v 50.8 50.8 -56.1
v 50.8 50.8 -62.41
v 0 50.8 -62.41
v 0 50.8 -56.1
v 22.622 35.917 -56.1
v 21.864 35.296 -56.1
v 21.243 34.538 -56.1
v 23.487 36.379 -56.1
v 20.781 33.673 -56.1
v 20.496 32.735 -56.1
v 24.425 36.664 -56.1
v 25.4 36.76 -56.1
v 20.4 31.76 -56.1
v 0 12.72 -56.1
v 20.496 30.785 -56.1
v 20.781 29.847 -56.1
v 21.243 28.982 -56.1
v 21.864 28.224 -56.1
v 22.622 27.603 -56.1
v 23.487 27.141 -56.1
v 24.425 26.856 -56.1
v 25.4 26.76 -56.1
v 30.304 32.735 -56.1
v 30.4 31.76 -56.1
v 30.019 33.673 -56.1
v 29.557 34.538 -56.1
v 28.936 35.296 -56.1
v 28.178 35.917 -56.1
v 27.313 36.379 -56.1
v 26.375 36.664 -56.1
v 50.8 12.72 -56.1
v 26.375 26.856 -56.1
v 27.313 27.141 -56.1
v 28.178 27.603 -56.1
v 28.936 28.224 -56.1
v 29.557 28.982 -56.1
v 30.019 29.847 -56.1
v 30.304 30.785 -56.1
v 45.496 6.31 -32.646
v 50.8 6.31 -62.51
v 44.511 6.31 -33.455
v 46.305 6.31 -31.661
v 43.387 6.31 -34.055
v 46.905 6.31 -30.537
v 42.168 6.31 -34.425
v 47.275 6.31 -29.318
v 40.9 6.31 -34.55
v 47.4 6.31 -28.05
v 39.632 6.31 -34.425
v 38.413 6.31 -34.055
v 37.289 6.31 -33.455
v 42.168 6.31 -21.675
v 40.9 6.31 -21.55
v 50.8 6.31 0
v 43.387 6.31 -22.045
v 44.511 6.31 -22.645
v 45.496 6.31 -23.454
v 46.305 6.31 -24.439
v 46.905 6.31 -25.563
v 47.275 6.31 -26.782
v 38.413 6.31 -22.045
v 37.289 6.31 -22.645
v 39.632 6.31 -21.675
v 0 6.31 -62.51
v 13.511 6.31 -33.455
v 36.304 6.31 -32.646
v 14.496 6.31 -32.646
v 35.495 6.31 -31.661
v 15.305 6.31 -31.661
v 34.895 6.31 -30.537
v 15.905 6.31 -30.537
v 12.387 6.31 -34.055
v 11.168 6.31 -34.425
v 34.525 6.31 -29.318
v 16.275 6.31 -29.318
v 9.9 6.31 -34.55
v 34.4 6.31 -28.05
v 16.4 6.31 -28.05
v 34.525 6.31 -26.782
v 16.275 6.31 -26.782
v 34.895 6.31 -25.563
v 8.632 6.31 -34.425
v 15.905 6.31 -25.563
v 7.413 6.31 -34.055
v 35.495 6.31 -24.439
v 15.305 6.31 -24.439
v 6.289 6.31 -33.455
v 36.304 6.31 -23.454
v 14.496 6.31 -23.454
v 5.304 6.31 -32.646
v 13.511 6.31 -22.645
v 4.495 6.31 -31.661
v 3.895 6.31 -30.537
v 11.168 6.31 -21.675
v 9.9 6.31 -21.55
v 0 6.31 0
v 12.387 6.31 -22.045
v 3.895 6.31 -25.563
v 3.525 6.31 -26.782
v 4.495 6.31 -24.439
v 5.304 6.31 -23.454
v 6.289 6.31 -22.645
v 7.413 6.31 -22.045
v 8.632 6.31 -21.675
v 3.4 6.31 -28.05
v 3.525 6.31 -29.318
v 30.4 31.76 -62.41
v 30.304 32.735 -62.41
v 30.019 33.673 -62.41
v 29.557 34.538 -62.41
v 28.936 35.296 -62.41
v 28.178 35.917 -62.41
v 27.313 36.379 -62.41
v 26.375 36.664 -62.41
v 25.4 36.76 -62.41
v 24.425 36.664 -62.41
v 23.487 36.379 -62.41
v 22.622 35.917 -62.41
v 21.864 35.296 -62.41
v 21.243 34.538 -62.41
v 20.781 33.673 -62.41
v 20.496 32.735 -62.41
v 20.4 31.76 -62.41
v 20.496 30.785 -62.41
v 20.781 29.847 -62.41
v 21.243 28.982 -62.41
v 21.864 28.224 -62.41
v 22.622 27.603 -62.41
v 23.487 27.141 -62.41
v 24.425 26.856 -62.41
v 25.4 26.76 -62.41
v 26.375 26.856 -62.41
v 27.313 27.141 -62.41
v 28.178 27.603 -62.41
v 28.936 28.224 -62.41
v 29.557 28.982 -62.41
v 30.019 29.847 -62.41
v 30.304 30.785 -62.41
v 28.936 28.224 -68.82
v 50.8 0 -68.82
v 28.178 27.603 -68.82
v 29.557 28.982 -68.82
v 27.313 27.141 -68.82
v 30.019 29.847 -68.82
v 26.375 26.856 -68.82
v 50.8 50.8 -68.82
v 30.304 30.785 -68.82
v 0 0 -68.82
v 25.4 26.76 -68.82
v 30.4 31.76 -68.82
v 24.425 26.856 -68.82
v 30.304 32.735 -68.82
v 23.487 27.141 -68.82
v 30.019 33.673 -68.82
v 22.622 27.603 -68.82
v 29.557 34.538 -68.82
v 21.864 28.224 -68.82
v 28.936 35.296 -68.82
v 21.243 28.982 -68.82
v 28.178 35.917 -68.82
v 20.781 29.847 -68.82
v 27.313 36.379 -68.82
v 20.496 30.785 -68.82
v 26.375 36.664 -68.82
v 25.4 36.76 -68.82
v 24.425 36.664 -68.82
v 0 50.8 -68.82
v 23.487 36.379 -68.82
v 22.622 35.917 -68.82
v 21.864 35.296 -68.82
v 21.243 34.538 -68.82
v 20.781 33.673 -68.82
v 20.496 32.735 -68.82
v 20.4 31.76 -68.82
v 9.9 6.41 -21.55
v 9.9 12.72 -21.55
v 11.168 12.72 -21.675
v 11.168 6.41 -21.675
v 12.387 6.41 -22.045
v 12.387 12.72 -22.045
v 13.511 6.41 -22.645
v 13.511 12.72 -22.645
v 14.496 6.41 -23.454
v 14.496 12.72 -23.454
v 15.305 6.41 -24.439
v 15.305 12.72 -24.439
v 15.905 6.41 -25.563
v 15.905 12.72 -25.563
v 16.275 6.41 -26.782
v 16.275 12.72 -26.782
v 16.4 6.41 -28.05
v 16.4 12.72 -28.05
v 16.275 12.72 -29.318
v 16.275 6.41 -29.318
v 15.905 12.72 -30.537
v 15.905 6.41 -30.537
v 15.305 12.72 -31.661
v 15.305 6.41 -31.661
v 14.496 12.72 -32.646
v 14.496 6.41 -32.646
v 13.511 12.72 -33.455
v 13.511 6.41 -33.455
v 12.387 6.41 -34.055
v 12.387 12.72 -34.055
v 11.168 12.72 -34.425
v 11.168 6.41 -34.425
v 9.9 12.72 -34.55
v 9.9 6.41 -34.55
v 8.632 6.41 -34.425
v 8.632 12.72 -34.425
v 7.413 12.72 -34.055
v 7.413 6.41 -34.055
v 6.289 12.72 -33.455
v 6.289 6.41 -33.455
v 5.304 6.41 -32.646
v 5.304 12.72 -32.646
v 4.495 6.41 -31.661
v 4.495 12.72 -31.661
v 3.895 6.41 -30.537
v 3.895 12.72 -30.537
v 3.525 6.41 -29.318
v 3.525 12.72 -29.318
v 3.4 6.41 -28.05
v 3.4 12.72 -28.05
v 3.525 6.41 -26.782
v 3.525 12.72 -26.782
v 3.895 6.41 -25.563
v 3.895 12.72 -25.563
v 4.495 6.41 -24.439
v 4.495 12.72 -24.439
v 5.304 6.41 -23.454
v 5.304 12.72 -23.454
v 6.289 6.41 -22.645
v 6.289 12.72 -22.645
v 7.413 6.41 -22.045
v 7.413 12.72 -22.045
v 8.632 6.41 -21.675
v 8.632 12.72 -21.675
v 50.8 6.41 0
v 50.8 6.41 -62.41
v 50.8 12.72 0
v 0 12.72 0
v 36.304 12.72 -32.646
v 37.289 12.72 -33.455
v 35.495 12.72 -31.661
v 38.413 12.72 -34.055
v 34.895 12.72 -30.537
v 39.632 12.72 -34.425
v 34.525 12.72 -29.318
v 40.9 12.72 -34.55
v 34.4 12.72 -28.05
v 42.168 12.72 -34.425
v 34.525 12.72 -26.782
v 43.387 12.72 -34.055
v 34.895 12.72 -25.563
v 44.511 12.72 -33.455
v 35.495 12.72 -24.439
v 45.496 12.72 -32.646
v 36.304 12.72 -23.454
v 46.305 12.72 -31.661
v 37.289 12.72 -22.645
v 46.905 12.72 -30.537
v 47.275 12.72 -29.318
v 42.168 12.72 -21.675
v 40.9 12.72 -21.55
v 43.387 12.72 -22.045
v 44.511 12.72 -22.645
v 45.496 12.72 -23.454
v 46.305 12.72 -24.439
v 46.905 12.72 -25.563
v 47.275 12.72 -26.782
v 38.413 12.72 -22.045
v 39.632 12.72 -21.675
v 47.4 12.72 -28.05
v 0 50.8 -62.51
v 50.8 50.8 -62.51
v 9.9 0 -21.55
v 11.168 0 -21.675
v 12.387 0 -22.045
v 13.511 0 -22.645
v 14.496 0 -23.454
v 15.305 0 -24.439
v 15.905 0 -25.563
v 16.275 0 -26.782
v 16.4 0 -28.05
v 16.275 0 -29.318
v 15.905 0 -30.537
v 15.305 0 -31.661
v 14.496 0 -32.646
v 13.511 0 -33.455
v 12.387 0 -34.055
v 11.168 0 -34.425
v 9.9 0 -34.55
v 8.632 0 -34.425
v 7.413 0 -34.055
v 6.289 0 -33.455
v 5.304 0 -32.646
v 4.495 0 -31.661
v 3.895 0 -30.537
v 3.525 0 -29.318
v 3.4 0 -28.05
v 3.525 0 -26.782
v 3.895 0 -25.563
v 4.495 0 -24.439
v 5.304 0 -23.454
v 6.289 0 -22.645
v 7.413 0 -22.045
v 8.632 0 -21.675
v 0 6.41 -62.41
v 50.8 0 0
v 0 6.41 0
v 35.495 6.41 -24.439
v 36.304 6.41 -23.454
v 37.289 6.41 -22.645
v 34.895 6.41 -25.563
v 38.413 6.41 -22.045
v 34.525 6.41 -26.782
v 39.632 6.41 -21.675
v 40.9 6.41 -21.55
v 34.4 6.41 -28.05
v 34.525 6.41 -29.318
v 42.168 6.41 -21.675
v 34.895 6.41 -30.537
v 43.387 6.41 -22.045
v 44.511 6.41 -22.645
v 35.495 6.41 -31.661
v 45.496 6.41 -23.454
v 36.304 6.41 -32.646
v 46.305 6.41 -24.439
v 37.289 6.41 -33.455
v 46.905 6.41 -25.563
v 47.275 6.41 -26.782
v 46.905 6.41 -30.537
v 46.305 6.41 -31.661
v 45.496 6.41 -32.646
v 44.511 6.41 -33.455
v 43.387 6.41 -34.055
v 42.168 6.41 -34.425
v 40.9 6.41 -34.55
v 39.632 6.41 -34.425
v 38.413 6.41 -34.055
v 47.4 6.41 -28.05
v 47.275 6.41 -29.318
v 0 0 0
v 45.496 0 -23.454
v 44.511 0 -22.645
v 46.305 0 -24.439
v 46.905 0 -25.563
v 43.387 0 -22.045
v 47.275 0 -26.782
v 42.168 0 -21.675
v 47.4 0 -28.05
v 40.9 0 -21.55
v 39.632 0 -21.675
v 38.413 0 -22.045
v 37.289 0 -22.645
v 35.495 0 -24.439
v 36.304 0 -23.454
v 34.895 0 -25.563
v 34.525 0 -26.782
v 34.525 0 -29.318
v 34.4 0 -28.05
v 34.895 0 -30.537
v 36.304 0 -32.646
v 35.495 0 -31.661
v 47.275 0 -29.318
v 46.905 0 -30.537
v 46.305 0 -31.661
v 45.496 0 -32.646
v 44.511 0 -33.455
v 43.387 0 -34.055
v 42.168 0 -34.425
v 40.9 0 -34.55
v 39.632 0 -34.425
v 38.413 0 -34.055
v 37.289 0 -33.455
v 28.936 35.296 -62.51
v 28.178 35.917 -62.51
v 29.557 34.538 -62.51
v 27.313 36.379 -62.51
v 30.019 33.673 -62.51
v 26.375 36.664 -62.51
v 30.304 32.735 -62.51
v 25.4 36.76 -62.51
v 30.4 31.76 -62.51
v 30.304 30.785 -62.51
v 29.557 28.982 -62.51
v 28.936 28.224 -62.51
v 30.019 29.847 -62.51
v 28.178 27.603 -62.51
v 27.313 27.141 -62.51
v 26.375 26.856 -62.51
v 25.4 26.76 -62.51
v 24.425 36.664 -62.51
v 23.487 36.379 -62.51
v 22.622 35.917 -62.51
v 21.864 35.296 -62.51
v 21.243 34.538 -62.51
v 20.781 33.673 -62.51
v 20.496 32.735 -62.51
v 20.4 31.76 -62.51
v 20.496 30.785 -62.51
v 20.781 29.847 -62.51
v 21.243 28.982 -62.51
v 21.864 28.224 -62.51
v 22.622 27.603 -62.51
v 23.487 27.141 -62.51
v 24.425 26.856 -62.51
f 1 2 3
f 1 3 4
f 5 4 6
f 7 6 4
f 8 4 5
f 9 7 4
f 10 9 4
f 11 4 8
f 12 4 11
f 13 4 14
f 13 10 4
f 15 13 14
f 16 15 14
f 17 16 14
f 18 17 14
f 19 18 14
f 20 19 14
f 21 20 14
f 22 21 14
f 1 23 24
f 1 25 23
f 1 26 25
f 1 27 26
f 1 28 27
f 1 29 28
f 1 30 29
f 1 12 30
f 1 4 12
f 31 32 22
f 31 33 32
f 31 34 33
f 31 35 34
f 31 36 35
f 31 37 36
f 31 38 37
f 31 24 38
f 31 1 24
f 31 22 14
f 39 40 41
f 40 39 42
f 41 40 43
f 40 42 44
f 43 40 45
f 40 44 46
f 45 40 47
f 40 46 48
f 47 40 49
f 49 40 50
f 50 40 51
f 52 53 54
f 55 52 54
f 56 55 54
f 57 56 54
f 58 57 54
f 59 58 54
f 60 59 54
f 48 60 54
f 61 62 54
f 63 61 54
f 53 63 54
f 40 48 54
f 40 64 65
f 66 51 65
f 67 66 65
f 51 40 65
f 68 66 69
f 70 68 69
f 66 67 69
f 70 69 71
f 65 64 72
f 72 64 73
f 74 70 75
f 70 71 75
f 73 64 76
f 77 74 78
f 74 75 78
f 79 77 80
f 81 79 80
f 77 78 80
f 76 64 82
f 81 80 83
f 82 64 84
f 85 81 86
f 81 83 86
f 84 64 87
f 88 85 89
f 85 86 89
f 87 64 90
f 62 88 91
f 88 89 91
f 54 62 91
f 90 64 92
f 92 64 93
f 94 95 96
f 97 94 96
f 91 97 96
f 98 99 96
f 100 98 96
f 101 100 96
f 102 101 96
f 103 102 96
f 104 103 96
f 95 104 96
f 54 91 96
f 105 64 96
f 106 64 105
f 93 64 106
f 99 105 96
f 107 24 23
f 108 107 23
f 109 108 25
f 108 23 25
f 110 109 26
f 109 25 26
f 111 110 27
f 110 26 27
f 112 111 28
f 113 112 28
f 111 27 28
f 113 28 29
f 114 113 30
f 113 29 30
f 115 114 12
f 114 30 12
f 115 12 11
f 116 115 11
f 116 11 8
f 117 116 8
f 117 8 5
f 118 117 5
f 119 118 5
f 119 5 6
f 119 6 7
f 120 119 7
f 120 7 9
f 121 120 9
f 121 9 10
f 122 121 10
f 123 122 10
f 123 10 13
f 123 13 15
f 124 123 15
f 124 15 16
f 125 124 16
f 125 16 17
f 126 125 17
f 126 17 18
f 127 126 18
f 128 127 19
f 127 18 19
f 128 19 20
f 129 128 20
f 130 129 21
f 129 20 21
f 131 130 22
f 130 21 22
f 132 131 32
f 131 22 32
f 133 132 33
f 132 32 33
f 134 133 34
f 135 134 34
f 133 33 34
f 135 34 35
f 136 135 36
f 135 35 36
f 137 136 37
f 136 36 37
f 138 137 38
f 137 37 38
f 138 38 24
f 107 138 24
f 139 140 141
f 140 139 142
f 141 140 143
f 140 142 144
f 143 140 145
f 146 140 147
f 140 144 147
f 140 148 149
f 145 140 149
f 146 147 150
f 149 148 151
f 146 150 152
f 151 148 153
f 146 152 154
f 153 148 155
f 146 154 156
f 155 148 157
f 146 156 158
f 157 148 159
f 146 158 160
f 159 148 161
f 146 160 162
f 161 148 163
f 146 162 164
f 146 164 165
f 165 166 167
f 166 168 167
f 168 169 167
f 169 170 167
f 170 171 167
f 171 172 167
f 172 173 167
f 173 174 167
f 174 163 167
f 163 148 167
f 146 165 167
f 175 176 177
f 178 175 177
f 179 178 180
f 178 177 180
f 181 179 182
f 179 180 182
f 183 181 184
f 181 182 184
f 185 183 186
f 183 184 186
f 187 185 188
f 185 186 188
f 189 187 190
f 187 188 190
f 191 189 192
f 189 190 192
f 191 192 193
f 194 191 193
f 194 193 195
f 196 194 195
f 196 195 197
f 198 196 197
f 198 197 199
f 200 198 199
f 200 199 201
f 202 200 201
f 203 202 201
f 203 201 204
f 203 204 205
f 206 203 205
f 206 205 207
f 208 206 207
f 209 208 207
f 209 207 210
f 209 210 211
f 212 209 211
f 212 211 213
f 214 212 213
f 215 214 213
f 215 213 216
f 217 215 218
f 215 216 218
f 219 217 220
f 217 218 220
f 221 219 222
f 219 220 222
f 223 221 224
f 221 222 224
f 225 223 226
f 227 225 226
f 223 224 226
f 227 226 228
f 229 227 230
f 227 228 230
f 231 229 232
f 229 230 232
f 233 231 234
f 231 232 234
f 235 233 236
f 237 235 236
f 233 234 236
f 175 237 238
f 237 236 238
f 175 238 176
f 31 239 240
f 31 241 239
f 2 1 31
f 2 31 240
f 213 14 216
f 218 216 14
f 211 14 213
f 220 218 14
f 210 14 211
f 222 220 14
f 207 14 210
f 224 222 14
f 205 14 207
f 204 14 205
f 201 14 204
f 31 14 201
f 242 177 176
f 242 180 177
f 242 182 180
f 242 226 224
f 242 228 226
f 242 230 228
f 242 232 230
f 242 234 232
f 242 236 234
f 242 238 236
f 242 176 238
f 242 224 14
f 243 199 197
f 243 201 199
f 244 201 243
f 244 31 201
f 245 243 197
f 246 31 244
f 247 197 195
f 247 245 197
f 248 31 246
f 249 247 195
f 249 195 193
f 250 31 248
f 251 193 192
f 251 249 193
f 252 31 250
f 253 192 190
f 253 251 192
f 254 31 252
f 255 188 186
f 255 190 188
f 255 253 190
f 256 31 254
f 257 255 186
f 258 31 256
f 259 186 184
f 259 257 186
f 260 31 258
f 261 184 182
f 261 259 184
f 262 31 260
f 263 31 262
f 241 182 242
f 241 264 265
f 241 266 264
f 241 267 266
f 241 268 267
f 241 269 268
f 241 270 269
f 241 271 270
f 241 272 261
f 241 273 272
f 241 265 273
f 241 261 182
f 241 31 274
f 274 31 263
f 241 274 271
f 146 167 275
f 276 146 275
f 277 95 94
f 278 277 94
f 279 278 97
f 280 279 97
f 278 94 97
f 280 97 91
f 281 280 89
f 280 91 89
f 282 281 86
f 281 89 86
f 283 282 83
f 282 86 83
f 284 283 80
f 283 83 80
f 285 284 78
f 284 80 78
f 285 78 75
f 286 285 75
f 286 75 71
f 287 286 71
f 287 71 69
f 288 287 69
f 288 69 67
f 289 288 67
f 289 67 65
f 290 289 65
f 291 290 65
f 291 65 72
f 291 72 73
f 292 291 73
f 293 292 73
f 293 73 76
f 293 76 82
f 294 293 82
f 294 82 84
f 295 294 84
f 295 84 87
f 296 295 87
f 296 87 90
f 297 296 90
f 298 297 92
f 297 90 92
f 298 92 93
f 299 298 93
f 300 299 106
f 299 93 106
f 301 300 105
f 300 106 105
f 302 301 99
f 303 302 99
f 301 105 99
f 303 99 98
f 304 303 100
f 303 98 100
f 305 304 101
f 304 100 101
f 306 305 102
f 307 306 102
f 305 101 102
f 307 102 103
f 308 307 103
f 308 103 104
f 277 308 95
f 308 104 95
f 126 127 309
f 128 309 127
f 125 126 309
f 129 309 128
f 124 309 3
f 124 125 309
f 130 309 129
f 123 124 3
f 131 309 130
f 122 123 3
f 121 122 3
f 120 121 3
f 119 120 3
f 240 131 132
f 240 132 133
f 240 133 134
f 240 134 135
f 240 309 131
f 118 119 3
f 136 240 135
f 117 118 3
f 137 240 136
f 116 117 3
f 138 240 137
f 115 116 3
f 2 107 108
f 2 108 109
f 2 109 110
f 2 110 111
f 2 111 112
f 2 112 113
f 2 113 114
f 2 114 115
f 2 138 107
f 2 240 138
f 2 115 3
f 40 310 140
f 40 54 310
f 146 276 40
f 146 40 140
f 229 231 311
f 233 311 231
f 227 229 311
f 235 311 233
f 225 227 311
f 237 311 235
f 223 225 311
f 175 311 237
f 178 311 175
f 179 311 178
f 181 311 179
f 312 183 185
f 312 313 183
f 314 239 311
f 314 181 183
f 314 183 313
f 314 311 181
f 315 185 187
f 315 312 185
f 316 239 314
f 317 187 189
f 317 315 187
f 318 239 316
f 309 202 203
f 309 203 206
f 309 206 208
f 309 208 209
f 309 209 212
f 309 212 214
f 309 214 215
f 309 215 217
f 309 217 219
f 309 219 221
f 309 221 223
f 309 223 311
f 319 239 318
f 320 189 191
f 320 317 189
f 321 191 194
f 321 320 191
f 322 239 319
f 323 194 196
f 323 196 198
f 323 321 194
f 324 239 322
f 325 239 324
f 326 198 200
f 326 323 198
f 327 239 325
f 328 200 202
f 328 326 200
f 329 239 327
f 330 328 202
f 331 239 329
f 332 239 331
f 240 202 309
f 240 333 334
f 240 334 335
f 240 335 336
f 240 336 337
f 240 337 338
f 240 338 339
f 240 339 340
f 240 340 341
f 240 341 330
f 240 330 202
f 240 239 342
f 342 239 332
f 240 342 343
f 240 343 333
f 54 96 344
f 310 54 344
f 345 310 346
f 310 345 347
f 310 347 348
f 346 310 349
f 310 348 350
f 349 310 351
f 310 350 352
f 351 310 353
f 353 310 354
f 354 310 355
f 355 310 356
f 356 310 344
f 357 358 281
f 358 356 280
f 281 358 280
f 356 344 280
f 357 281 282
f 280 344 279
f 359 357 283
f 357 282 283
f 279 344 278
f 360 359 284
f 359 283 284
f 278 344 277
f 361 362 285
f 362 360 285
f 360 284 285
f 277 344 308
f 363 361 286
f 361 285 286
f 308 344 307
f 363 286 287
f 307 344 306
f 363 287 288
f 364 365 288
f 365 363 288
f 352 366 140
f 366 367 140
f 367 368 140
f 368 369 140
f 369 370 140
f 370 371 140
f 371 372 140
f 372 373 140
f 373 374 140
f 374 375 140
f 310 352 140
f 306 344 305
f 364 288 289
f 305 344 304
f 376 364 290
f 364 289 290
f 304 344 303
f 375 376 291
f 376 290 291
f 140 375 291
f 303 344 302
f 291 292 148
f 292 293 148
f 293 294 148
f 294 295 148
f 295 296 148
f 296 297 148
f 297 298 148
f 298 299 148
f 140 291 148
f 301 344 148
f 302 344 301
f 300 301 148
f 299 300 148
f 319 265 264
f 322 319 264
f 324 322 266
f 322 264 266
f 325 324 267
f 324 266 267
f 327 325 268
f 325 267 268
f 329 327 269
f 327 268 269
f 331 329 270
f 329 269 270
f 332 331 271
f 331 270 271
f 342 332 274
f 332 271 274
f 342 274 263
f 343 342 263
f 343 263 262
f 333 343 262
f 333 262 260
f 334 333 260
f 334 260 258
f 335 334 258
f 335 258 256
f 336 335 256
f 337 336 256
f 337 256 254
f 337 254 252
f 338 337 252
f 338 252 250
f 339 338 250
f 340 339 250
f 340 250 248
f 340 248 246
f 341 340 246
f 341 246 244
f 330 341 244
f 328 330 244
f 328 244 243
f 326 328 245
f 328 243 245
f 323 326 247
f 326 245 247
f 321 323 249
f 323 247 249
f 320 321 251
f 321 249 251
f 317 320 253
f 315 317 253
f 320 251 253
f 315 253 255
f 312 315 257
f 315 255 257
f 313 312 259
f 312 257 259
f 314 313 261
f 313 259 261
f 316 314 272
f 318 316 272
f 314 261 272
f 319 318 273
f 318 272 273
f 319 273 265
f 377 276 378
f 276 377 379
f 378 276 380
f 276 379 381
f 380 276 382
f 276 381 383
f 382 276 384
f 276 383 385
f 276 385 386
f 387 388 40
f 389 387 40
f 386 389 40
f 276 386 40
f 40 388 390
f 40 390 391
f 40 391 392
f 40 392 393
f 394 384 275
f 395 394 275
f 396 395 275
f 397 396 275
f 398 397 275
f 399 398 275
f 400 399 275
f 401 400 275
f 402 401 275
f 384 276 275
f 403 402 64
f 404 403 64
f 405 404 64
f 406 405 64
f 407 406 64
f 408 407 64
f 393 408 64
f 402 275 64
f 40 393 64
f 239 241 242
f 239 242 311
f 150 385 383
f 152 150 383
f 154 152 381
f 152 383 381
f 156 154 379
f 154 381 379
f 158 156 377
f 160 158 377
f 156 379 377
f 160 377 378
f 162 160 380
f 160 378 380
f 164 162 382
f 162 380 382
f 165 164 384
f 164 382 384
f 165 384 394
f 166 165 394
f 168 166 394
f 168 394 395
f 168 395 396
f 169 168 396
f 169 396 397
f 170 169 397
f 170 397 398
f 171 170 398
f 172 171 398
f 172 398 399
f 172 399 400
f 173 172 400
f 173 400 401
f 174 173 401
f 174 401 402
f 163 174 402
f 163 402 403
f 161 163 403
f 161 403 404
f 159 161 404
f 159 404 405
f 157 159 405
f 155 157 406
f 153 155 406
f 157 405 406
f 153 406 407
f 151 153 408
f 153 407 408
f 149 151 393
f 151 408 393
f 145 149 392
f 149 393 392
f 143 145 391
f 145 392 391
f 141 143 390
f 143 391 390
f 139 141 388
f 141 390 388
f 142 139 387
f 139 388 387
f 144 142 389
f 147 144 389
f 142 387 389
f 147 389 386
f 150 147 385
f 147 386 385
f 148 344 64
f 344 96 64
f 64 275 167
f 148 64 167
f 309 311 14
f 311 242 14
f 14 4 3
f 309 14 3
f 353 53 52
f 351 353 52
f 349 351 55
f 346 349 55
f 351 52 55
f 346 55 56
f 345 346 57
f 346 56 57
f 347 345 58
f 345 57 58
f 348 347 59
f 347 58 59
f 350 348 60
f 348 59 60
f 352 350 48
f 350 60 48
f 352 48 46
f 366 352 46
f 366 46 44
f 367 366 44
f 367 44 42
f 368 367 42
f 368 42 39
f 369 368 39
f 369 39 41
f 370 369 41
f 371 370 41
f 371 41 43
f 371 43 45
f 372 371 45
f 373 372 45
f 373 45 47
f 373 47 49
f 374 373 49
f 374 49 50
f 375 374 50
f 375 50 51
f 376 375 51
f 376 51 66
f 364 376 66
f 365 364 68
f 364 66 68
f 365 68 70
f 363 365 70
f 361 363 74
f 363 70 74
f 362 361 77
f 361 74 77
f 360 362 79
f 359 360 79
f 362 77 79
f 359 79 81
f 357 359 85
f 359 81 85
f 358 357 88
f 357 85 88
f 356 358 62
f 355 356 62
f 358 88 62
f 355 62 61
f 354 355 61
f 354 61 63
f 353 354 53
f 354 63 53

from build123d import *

# Parameters (mm, degrees)
SALIENTE_EXTRUIR1_DEPTH = 50.8
SALIENTE_EXTRUIR2_DEPTH = 50.8
CROQUIS4_R              = 6.5
CORTAR_EXTRUIR1_DEPTH   = 97.8
CROQUIS5_R              = 5
CORTAR_EXTRUIR2_DEPTH   = 22


with BuildPart() as part:
    # Croquis1 → Saliente-Extruir1 (new body)
    with BuildSketch(Plane(origin=(0, 0, 0), x_dir=(0, 0, -1), z_dir=(1, 0, 0))):
        Polygon((0, 0), (68.82, 0), (68.82, 50.8), (62.51, 50.8), (62.51, 6.31), (0, 6.31), align=None)
    extrude(amount=SALIENTE_EXTRUIR1_DEPTH)


with BuildPart() as body_2:
    # Croquis2 → Saliente-Extruir2 (new body)
    with BuildSketch(Plane(origin=(50.8, 0, 0), x_dir=(0, 0, -1), z_dir=(1, 0, 0))):
        Polygon((0, 6.41), (62.41, 6.41), (62.41, 50.8), (56.1, 50.8), (56.1, 12.72), (0, 12.72), align=None)
    extrude(amount=-SALIENTE_EXTRUIR2_DEPTH)


with BuildPart() as cortar_extruir1_tool:
    # Croquis4 → Cortar-Extruir1 (new body)
    with BuildSketch(Plane(origin=(0, 12.72, 0), x_dir=(1, 0, 0), z_dir=(0, 1, 0))):
        with Locations(Location((9.9, 28.05, 0), (0, 0, 270))):
            Circle(CROQUIS4_R)
        with Locations(Location((40.9, 28.05, 0), (0, 0, 270))):
            Circle(CROQUIS4_R)
    extrude(amount=-CORTAR_EXTRUIR1_DEPTH)


with BuildPart() as part_1:
    add(part.part)

    # Cortar-Extruir1: cut by cortar_extruir1_tool
    add(cortar_extruir1_tool.part, mode=Mode.SUBTRACT)


with BuildPart() as body_2_1:
    add(body_2.part)

    # Cortar-Extruir1: cut by cortar_extruir1_tool
    add(cortar_extruir1_tool.part, mode=Mode.SUBTRACT)


with BuildPart() as cortar_extruir2_tool:
    # Croquis5 → Cortar-Extruir2 (new body)
    with BuildSketch(Plane.XY.offset(-56.1)):
        with Locations((25.4, 31.76)):
            Circle(CROQUIS5_R)
    extrude(amount=-CORTAR_EXTRUIR2_DEPTH)


with BuildPart() as part_2:
    add(part_1.part)

    # Cortar-Extruir2: cut by cortar_extruir2_tool
    add(cortar_extruir2_tool.part, mode=Mode.SUBTRACT)


with BuildPart() as body_2_2:
    add(body_2_1.part)

    # Cortar-Extruir2: cut by cortar_extruir2_tool
    add(cortar_extruir2_tool.part, mode=Mode.SUBTRACT)


solid = Compound([part_2.part, body_2_2.part])
